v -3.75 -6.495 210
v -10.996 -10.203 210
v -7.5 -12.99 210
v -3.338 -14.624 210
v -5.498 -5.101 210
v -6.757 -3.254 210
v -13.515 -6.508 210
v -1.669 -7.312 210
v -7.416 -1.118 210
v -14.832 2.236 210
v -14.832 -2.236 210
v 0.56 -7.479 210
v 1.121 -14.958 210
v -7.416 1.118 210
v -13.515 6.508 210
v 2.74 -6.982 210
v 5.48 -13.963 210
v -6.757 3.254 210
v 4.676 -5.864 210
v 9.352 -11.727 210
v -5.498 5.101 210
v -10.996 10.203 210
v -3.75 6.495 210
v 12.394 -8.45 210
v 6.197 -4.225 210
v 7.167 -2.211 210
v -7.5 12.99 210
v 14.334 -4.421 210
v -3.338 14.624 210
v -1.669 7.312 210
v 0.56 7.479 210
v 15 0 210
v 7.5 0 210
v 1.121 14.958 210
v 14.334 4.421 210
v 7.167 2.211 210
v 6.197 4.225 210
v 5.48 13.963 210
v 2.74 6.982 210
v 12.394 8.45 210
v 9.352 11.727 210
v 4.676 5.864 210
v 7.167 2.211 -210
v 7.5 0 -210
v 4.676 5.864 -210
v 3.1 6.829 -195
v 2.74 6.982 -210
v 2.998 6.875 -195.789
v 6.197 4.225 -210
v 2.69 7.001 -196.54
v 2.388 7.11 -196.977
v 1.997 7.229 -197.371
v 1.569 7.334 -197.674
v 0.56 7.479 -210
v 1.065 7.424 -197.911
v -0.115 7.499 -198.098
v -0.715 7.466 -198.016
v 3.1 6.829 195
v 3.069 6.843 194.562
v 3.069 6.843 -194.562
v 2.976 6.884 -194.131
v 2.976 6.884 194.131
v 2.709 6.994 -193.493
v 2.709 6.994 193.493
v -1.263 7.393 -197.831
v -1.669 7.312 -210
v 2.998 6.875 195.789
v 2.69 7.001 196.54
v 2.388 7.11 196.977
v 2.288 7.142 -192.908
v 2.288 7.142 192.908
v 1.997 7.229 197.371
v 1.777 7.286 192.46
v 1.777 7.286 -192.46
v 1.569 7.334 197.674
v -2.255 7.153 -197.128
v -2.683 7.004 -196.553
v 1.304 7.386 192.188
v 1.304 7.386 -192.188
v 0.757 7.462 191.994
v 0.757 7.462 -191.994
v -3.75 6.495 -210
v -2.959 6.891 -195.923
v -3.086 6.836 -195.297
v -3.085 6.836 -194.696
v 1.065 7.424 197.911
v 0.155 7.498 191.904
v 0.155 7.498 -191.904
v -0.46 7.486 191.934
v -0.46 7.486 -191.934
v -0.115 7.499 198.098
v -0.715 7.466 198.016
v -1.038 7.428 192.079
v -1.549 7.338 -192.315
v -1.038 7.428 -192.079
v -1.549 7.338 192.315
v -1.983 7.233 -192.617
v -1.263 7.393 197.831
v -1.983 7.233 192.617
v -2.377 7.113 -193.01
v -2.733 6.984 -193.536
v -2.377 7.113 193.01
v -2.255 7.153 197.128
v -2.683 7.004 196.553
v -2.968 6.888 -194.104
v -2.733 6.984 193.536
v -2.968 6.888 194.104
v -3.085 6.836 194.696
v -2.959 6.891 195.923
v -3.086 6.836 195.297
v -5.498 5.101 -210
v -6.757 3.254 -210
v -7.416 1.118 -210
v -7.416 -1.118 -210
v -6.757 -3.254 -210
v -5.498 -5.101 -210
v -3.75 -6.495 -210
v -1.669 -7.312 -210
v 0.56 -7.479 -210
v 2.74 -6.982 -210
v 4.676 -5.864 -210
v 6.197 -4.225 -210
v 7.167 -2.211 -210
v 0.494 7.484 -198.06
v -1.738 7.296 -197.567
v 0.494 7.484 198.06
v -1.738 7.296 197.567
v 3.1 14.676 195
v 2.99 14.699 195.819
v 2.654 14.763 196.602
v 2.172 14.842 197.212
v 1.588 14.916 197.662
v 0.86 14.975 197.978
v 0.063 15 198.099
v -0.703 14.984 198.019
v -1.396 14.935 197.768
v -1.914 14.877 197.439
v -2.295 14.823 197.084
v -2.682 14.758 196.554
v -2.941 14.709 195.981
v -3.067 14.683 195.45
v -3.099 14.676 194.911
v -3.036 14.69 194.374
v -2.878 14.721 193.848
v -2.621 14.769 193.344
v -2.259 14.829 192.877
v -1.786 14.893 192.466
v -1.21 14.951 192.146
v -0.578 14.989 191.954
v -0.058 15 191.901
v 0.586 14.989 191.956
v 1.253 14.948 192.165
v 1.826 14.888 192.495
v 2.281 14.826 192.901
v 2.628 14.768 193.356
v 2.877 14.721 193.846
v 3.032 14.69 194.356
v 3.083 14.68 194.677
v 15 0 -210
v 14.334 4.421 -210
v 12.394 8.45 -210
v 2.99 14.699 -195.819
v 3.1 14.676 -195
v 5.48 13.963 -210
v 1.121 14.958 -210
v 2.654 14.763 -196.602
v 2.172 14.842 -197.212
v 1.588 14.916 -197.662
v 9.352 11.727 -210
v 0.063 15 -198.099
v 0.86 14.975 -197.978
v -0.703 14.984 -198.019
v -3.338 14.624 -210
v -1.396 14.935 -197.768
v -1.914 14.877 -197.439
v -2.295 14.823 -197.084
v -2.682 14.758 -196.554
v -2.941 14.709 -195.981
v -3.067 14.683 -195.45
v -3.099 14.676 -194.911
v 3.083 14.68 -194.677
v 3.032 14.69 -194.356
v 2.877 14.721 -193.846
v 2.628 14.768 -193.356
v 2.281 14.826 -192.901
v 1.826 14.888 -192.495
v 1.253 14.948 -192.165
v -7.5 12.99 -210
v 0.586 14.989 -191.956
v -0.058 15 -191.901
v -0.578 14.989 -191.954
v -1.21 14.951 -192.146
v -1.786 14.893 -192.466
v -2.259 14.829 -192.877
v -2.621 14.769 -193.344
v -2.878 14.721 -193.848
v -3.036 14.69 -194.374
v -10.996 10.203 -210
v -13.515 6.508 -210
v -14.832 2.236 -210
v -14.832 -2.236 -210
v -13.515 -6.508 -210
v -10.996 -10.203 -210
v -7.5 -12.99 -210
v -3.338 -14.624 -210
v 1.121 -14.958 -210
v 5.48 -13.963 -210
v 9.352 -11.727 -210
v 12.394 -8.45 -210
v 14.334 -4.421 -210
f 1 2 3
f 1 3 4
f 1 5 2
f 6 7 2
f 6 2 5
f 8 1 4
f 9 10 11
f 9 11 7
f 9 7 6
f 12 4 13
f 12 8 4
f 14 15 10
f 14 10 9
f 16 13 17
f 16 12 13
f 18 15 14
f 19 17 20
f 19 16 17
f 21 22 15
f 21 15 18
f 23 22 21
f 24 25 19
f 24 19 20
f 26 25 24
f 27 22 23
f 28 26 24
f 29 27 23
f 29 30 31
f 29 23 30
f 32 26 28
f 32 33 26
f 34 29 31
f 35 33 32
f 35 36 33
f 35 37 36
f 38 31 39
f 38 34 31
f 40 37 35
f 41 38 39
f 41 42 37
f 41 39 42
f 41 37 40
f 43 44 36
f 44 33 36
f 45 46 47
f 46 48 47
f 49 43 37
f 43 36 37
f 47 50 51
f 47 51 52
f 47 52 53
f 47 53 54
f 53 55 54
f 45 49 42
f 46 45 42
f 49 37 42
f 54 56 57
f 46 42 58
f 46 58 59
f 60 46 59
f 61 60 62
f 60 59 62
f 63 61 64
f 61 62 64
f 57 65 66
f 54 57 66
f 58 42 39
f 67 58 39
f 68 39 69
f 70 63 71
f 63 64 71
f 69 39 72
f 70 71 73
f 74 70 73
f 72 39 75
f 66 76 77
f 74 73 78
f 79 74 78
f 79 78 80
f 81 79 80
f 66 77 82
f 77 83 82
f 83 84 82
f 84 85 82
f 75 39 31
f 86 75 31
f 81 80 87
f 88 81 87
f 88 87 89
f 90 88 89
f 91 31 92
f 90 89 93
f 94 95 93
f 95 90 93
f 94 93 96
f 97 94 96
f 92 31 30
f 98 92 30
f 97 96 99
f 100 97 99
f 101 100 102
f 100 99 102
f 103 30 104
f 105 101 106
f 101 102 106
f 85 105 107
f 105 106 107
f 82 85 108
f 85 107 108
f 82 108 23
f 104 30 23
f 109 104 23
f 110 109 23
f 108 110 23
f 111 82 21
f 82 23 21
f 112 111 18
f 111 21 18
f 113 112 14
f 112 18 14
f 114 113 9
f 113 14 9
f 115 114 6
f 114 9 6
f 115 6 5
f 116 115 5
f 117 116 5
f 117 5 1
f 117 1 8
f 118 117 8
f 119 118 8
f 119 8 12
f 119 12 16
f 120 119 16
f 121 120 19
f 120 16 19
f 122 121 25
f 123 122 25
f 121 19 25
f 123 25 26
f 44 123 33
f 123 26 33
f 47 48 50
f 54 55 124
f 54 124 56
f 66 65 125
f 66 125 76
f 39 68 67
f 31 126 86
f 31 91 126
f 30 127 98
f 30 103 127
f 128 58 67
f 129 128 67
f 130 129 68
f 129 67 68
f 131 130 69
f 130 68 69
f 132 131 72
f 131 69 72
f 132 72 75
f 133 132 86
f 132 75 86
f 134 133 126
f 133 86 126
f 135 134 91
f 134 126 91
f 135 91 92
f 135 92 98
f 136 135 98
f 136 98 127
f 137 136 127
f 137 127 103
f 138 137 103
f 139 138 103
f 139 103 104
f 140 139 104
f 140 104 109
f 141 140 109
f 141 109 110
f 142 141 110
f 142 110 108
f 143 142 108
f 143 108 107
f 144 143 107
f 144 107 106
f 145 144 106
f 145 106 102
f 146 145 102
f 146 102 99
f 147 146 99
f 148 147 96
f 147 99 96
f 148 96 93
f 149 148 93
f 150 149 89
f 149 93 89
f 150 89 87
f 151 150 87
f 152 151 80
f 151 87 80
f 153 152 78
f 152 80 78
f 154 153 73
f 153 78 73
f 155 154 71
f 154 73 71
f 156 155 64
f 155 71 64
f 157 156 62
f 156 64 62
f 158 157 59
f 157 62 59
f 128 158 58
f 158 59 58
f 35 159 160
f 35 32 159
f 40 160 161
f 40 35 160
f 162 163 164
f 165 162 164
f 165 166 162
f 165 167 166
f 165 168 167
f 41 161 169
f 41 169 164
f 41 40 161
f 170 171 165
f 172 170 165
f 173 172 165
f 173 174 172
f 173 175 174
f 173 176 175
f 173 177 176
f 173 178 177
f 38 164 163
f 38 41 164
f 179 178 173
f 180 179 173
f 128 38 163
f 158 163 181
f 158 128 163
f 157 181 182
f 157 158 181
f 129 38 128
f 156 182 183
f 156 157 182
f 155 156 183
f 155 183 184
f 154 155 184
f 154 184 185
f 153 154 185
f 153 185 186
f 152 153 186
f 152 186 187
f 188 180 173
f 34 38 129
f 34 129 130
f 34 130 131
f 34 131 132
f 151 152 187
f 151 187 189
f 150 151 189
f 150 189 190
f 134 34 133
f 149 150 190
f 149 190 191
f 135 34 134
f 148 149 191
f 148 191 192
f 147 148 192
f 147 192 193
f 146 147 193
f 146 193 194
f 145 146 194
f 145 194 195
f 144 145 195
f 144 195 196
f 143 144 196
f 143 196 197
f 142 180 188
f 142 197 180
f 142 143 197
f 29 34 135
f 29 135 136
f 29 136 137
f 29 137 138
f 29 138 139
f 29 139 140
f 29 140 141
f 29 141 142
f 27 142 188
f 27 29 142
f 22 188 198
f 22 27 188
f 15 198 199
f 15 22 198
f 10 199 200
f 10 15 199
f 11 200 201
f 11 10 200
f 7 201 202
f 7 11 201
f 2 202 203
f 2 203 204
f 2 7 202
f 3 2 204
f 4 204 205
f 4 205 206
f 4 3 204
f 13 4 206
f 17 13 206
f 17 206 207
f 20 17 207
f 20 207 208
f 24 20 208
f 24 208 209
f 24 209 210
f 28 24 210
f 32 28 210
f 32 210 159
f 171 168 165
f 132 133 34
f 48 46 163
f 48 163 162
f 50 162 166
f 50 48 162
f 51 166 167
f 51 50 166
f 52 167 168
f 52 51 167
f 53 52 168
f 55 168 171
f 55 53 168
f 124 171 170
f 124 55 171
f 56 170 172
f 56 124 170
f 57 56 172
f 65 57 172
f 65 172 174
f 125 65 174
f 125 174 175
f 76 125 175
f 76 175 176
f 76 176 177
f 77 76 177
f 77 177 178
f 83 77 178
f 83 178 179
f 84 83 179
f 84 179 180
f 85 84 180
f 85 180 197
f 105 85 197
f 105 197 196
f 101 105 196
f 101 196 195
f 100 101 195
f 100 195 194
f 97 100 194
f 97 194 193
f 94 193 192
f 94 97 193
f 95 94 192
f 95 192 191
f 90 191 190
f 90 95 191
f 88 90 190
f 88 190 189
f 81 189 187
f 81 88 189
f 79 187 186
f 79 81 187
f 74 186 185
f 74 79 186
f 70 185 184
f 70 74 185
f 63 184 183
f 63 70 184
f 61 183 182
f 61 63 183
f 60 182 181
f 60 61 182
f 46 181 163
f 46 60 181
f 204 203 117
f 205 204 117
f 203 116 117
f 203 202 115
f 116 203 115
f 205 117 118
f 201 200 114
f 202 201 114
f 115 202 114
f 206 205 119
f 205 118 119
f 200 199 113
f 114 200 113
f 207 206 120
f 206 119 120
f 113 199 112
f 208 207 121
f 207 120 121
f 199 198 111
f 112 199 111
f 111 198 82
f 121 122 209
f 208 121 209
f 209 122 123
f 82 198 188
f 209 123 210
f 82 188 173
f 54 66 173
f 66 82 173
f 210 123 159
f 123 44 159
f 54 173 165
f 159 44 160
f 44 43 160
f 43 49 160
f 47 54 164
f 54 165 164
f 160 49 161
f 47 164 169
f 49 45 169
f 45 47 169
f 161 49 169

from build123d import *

# Parameters (mm, degrees)
BOSS_EXTRUDE1_DEPTH      = 210
BOSS_EXTRUDE1_DEPTH_BACK = 210
SKETCH1_R                = 15
SKETCH1_R_2              = 7.5
SKETCH3_R                = 3.1
CUT_EXTRUDE1_DEPTH       = 30


with BuildPart() as part:
    # Sketch1 → Boss-Extrude1 (new, two sides: drawn at the far end of the back side and taken through both)
    with BuildSketch(Plane.XY.offset(-BOSS_EXTRUDE1_DEPTH_BACK)):
        Circle(SKETCH1_R)
        Circle(SKETCH1_R_2, mode=Mode.SUBTRACT)
    extrude(amount=BOSS_EXTRUDE1_DEPTH + BOSS_EXTRUDE1_DEPTH_BACK)

    # Sketch3 → Cut-Extrude1 (cut)
    with BuildSketch(Plane(origin=(0, 0, 0), x_dir=(1, 0, 0), z_dir=(0, 1, 0))):
        with Locations((0, 195)):
            Circle(SKETCH3_R)
    cut_extrude1 = extrude(amount=CUT_EXTRUDE1_DEPTH, mode=Mode.SUBTRACT)

    # Mirror1: Cut-Extrude1 across plane
    add(cut_extrude1.mirror(Plane.XY), mode=Mode.SUBTRACT)


solid = part.part
